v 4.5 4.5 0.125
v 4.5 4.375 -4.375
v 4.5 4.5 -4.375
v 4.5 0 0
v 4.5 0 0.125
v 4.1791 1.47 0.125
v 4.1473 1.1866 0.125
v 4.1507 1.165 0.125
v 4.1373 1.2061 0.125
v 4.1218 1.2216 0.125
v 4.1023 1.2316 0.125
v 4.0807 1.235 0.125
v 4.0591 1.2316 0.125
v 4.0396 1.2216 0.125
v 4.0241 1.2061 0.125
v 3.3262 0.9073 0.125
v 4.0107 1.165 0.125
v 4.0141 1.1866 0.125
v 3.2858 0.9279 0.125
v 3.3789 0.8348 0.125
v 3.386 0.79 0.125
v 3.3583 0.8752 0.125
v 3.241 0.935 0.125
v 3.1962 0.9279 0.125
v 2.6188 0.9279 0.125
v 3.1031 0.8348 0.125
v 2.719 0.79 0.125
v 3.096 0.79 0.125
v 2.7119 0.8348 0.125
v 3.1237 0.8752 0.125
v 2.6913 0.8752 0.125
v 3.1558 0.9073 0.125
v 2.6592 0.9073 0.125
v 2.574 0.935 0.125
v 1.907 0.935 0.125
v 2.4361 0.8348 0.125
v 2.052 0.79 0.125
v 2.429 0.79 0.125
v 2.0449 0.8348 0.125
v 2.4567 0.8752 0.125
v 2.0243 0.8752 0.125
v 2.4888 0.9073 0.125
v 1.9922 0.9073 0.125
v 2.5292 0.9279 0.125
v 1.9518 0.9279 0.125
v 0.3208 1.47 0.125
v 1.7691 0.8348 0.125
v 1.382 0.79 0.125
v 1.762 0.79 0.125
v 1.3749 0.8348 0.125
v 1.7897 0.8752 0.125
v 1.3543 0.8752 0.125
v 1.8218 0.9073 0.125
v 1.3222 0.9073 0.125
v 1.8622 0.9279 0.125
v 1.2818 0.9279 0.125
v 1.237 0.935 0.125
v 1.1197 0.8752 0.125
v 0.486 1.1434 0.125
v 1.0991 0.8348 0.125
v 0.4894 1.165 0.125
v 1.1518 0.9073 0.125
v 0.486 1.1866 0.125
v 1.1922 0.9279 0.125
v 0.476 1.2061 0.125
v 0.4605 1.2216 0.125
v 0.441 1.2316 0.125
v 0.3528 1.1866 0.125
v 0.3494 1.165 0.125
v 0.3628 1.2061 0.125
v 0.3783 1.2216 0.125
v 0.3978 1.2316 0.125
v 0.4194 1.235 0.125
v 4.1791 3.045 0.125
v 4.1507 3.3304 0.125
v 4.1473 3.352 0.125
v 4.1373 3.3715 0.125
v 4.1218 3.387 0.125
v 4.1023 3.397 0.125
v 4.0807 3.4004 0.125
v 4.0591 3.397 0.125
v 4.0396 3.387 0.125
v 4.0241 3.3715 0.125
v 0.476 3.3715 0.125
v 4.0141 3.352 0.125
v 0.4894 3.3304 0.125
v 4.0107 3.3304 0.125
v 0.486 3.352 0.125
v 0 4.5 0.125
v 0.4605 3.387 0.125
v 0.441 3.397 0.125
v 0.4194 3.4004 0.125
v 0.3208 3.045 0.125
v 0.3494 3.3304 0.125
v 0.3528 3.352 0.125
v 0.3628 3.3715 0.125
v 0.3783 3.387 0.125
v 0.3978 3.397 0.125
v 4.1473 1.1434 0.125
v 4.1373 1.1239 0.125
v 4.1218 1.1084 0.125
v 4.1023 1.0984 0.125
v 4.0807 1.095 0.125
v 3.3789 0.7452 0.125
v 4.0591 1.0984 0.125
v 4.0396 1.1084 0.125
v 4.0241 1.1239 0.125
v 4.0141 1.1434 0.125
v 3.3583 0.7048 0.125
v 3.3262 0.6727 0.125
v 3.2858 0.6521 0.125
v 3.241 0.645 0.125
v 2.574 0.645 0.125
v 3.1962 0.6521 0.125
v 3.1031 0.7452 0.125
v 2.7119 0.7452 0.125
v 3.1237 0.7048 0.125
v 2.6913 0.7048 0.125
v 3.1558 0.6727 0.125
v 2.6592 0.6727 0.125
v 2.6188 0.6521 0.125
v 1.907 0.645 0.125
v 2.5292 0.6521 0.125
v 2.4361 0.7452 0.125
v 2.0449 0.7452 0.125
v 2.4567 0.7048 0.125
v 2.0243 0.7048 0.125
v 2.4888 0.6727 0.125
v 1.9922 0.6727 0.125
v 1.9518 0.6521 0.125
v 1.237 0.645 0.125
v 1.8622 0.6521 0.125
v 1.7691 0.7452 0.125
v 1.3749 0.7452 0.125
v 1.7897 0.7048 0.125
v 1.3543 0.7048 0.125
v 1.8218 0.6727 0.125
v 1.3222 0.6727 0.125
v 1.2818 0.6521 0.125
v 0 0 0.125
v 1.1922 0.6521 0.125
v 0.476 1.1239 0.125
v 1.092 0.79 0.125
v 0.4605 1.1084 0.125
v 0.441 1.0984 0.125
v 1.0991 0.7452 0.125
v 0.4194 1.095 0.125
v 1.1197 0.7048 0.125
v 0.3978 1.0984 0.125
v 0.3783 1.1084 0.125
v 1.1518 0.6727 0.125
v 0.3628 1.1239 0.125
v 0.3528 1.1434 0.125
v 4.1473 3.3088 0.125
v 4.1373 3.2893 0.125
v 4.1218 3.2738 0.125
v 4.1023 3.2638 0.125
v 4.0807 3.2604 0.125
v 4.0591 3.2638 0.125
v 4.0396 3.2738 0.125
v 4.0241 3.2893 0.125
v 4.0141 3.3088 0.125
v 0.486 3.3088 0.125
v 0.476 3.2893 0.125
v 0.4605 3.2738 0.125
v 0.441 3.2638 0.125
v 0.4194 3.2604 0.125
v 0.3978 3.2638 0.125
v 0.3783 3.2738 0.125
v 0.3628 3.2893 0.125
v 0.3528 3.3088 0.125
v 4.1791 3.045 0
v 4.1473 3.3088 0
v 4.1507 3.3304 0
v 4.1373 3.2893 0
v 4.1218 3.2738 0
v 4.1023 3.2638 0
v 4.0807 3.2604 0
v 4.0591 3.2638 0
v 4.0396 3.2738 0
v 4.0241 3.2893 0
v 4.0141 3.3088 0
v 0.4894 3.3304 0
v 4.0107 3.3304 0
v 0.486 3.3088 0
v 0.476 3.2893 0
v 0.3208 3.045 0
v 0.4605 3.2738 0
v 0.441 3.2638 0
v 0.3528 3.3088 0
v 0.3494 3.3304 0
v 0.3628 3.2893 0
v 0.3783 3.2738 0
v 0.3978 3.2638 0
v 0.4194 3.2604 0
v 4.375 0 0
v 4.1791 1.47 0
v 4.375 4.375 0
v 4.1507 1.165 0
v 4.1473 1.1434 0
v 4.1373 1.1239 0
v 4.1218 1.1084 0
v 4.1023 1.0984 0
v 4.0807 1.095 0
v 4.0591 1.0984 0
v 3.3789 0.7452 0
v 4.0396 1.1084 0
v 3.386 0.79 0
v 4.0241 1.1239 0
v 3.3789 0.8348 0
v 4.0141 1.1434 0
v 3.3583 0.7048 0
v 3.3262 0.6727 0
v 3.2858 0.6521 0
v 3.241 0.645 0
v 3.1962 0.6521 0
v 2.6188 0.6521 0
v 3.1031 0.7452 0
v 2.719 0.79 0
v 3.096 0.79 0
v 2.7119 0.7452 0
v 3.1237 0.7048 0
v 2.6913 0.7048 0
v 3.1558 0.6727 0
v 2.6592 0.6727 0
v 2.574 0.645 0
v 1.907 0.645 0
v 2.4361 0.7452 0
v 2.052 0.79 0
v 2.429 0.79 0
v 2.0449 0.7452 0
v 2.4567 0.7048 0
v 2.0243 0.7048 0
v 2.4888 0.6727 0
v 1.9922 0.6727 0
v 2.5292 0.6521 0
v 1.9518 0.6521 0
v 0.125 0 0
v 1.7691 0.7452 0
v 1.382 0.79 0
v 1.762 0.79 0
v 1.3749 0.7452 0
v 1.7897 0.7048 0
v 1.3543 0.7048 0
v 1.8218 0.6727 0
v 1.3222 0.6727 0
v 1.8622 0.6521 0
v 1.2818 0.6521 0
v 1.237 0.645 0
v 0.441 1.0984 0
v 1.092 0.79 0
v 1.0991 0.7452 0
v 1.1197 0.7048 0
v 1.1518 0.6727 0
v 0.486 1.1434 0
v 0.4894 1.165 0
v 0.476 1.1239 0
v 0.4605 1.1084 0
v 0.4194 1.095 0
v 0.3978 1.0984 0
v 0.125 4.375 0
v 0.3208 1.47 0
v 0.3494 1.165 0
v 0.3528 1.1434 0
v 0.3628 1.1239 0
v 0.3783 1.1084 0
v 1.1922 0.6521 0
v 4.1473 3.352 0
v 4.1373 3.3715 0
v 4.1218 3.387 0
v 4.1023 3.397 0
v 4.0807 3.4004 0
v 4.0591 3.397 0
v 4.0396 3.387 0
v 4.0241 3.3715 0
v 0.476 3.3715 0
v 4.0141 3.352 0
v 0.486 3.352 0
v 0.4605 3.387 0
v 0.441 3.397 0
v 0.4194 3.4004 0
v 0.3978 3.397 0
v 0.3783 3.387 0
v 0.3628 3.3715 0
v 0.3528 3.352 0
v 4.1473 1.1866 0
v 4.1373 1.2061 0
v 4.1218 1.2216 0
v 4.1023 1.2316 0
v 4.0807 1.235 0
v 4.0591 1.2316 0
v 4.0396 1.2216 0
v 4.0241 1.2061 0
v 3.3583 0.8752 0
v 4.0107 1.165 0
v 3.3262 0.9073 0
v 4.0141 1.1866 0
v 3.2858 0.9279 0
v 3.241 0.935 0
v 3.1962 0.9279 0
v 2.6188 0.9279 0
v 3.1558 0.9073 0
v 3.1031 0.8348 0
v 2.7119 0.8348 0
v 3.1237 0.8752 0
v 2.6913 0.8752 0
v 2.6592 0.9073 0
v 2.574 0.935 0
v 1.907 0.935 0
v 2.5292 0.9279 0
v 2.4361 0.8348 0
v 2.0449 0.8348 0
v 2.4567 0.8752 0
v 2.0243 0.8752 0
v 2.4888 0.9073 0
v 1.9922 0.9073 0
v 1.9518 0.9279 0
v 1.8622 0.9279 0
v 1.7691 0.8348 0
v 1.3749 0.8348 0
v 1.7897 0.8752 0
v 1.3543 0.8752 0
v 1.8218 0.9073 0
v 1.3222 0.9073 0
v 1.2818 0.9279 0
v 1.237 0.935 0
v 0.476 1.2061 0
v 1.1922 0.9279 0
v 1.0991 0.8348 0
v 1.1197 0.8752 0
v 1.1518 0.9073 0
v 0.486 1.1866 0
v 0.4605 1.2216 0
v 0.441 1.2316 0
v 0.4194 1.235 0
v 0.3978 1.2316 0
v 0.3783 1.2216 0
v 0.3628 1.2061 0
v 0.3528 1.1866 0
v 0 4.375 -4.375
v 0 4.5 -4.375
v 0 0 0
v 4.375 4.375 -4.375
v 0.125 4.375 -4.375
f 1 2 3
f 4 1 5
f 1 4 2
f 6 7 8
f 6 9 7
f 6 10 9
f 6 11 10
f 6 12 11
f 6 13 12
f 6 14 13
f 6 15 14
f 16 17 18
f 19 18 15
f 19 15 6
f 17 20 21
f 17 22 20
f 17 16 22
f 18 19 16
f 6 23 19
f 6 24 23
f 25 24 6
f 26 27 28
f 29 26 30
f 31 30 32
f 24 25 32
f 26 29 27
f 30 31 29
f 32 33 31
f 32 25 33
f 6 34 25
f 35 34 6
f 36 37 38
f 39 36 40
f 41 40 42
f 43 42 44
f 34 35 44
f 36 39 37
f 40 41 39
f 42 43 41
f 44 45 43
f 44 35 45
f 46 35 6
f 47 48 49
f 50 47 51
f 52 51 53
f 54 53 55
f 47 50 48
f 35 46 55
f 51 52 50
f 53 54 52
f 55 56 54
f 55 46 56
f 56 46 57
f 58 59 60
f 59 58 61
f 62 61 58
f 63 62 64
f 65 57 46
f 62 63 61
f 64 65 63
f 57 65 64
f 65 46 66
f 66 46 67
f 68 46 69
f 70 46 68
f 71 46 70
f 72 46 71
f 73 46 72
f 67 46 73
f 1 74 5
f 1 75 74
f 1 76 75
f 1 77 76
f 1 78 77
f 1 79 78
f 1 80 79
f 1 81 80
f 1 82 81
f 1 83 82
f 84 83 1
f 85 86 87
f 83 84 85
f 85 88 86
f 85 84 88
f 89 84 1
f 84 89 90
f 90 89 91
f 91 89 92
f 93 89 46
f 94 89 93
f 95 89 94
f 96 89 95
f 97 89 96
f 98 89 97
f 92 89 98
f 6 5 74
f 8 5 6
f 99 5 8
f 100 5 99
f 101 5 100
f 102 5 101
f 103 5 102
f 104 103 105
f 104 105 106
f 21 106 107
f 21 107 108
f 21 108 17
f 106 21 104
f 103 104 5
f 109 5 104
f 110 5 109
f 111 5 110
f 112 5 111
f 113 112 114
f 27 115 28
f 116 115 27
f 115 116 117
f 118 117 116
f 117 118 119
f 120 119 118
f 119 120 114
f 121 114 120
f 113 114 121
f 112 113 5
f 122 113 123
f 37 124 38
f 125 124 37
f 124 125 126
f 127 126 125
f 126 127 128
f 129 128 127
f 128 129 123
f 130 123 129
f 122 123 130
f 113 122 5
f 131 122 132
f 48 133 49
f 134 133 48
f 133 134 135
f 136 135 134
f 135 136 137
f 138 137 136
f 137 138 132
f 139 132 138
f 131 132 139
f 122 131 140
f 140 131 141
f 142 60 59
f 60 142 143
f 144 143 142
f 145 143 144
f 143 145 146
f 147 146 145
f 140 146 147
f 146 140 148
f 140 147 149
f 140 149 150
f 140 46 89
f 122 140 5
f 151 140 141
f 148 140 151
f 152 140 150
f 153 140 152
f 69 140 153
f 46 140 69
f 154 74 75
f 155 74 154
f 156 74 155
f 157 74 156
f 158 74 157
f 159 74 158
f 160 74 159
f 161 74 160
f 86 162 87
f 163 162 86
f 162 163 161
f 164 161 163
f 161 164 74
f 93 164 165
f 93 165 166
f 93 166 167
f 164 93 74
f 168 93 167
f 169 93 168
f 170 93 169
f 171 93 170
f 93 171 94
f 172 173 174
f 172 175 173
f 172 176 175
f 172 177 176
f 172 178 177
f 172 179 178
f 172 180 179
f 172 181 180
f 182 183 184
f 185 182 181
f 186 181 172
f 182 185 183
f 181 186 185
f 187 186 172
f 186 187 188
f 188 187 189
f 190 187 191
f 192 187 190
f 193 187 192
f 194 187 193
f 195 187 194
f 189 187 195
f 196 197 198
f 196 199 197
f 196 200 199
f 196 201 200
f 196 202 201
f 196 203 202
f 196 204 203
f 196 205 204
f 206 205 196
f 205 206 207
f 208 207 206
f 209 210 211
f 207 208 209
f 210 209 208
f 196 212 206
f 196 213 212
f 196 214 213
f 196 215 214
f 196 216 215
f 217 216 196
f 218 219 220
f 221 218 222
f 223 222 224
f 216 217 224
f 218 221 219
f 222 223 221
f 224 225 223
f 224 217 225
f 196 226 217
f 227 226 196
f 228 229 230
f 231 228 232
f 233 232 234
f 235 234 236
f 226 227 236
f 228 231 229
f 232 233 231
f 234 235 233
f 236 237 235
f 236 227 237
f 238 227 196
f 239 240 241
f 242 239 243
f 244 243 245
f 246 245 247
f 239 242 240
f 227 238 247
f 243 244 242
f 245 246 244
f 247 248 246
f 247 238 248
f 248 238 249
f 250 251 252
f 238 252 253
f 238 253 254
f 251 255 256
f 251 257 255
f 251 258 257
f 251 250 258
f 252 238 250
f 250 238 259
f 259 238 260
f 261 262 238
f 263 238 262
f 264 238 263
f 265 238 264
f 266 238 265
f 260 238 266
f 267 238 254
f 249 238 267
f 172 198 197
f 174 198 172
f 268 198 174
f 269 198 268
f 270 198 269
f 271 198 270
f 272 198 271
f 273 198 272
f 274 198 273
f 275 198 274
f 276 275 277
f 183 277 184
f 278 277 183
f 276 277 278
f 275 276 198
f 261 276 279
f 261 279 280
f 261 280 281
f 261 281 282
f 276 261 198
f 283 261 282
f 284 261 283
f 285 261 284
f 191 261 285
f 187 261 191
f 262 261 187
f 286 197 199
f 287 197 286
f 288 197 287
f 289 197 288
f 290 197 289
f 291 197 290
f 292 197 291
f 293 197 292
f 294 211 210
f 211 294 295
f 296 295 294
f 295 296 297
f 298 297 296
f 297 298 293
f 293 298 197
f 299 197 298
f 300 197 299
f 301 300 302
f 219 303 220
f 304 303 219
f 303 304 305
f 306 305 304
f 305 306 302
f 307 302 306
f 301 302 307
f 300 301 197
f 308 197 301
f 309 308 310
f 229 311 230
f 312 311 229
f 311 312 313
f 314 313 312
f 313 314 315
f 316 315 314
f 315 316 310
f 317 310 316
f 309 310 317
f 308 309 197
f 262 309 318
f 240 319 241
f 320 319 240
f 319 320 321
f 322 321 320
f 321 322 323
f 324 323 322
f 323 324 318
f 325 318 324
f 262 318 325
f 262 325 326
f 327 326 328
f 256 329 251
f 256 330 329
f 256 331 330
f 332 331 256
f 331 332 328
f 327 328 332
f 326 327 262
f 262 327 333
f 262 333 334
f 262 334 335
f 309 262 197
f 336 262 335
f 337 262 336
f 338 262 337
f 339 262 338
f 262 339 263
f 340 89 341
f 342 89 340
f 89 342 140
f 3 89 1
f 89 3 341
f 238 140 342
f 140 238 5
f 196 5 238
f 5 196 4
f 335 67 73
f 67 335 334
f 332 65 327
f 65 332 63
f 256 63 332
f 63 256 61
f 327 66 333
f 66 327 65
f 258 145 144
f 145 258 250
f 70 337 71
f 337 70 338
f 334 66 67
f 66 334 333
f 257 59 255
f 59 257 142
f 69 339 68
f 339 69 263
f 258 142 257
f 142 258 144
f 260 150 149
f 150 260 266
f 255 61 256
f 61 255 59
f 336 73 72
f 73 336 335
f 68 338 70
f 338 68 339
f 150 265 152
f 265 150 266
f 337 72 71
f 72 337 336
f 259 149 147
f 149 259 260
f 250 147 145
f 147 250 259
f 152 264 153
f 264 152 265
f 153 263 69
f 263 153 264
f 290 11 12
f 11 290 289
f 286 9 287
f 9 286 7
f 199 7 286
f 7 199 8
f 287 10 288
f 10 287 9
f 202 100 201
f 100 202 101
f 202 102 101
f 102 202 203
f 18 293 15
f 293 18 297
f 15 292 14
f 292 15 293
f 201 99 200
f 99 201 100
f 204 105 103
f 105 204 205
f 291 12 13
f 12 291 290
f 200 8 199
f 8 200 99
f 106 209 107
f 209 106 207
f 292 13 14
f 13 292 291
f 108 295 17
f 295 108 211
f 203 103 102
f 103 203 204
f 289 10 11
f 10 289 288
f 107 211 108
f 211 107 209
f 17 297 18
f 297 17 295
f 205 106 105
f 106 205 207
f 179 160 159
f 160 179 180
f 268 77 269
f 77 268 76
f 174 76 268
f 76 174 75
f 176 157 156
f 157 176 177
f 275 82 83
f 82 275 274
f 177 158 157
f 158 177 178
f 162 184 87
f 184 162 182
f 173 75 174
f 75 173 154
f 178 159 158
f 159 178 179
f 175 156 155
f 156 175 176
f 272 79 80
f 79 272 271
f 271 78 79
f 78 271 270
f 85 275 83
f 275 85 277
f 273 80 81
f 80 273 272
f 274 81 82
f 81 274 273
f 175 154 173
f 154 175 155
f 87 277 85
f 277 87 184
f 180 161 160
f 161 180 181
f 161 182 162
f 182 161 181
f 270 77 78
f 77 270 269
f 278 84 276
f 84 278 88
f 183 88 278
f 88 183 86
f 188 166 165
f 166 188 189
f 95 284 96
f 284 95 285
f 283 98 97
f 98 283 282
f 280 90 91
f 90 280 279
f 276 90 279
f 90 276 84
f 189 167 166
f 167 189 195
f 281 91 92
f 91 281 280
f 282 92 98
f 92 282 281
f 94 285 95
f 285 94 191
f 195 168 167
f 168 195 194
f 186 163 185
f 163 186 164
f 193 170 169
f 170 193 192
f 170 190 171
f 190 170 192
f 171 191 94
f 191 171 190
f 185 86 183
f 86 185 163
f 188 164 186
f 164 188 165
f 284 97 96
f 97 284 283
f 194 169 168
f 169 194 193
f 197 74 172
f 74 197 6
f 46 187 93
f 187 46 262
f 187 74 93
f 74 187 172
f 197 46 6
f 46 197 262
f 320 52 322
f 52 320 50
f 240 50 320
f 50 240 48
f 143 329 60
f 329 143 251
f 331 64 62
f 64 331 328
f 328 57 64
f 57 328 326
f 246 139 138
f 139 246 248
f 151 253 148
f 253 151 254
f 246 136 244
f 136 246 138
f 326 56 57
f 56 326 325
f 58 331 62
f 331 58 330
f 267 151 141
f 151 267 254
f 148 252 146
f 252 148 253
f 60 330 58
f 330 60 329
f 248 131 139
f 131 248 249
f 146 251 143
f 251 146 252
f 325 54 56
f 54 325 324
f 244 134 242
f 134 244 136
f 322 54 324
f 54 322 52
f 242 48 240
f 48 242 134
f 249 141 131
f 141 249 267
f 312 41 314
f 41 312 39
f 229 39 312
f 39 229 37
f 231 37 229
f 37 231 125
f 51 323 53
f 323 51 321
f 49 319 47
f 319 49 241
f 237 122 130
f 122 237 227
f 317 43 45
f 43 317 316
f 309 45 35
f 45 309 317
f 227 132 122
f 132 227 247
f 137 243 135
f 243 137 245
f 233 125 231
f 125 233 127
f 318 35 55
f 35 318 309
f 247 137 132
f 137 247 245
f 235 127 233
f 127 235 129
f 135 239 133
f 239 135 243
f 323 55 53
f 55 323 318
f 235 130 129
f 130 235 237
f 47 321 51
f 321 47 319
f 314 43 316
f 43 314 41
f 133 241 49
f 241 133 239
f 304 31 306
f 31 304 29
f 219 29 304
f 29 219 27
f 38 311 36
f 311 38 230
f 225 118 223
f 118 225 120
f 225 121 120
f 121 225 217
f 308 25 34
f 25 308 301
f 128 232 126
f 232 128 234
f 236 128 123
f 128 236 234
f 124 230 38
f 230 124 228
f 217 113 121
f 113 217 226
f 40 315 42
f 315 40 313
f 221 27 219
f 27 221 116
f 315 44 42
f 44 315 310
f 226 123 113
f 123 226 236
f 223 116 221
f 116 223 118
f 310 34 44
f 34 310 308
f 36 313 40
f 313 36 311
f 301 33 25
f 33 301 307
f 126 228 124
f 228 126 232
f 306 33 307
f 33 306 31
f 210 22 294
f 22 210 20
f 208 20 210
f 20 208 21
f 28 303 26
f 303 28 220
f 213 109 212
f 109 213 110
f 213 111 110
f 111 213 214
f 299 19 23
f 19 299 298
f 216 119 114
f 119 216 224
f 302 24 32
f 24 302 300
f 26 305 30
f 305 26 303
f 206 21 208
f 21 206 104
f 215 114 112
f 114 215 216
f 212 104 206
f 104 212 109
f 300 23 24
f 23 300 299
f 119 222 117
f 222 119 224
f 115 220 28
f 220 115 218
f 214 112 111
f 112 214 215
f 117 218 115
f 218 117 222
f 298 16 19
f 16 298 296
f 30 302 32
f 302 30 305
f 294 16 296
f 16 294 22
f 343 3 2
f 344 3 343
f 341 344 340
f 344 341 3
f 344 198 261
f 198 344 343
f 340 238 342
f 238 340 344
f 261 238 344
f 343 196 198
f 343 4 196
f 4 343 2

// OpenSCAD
$fn=20;
difference() {
	cube([4.5,4.5,0.125]);
	// Mounting Holes
//	translate([0.375,0.375,-0.125]) cylinder(r=0.07,h=0.375);
//	translate([4.125,0.375,-0.125]) cylinder(r=0.07,h=0.375);
//	translate([4.125,3.625,-0.125]) cylinder(r=0.07,h=0.375);
//	translate([0.375,3.625,-0.125]) cylinder(r=0.07,h=0.375);
	// PCB Holes
	translate([0.4194,1.165,-0.125]) cylinder(r=0.07,h=0.375);
	translate([4.0807,1.165,-0.125]) cylinder(r=0.07,h=0.375);
	translate([4.0807,3.3304,-0.125]) cylinder(r=0.07,h=0.375);
	translate([0.4194,3.3304,-0.125]) cylinder(r=0.07,h=0.375);
	// Display Cutout
	translate([0.32085,1.47,-0.125]) cube([3.8583,1.575,0.375]);
	// Switch Holes
	translate([1.237,0.79,-0.125]) cylinder(r=0.145,h=0.375);
	translate([1.907,0.79,-0.125]) cylinder(r=0.145,h=0.375);
	translate([2.574,0.79,-0.125]) cylinder(r=0.145,h=0.375);
	translate([3.241,0.79,-0.125]) cylinder(r=0.145,h=0.375);
}

// Back
translate([0,4.375,0.125]) {
	rotate(a=[-90,0,0]) {
		cube([4.5,4.5,0.125]);
	}
}

// Sides
translate([0.0625,0,0])
rotate(a=[0,90,0])
linear_extrude(height = 0.125, center = true, convexity = 10, twist = 0)
polygon(points=[[0,0],[4.375,4.375],[0,4.375]], paths=[[0,1,2]]);

translate([4.4375,0,0])
rotate(a=[0,90,0])
linear_extrude(height = 0.125, center = true, convexity = 10, twist = 0)
polygon(points=[[0,0],[4.375,4.375],[0,4.375]], paths=[[0,1,2]]);
